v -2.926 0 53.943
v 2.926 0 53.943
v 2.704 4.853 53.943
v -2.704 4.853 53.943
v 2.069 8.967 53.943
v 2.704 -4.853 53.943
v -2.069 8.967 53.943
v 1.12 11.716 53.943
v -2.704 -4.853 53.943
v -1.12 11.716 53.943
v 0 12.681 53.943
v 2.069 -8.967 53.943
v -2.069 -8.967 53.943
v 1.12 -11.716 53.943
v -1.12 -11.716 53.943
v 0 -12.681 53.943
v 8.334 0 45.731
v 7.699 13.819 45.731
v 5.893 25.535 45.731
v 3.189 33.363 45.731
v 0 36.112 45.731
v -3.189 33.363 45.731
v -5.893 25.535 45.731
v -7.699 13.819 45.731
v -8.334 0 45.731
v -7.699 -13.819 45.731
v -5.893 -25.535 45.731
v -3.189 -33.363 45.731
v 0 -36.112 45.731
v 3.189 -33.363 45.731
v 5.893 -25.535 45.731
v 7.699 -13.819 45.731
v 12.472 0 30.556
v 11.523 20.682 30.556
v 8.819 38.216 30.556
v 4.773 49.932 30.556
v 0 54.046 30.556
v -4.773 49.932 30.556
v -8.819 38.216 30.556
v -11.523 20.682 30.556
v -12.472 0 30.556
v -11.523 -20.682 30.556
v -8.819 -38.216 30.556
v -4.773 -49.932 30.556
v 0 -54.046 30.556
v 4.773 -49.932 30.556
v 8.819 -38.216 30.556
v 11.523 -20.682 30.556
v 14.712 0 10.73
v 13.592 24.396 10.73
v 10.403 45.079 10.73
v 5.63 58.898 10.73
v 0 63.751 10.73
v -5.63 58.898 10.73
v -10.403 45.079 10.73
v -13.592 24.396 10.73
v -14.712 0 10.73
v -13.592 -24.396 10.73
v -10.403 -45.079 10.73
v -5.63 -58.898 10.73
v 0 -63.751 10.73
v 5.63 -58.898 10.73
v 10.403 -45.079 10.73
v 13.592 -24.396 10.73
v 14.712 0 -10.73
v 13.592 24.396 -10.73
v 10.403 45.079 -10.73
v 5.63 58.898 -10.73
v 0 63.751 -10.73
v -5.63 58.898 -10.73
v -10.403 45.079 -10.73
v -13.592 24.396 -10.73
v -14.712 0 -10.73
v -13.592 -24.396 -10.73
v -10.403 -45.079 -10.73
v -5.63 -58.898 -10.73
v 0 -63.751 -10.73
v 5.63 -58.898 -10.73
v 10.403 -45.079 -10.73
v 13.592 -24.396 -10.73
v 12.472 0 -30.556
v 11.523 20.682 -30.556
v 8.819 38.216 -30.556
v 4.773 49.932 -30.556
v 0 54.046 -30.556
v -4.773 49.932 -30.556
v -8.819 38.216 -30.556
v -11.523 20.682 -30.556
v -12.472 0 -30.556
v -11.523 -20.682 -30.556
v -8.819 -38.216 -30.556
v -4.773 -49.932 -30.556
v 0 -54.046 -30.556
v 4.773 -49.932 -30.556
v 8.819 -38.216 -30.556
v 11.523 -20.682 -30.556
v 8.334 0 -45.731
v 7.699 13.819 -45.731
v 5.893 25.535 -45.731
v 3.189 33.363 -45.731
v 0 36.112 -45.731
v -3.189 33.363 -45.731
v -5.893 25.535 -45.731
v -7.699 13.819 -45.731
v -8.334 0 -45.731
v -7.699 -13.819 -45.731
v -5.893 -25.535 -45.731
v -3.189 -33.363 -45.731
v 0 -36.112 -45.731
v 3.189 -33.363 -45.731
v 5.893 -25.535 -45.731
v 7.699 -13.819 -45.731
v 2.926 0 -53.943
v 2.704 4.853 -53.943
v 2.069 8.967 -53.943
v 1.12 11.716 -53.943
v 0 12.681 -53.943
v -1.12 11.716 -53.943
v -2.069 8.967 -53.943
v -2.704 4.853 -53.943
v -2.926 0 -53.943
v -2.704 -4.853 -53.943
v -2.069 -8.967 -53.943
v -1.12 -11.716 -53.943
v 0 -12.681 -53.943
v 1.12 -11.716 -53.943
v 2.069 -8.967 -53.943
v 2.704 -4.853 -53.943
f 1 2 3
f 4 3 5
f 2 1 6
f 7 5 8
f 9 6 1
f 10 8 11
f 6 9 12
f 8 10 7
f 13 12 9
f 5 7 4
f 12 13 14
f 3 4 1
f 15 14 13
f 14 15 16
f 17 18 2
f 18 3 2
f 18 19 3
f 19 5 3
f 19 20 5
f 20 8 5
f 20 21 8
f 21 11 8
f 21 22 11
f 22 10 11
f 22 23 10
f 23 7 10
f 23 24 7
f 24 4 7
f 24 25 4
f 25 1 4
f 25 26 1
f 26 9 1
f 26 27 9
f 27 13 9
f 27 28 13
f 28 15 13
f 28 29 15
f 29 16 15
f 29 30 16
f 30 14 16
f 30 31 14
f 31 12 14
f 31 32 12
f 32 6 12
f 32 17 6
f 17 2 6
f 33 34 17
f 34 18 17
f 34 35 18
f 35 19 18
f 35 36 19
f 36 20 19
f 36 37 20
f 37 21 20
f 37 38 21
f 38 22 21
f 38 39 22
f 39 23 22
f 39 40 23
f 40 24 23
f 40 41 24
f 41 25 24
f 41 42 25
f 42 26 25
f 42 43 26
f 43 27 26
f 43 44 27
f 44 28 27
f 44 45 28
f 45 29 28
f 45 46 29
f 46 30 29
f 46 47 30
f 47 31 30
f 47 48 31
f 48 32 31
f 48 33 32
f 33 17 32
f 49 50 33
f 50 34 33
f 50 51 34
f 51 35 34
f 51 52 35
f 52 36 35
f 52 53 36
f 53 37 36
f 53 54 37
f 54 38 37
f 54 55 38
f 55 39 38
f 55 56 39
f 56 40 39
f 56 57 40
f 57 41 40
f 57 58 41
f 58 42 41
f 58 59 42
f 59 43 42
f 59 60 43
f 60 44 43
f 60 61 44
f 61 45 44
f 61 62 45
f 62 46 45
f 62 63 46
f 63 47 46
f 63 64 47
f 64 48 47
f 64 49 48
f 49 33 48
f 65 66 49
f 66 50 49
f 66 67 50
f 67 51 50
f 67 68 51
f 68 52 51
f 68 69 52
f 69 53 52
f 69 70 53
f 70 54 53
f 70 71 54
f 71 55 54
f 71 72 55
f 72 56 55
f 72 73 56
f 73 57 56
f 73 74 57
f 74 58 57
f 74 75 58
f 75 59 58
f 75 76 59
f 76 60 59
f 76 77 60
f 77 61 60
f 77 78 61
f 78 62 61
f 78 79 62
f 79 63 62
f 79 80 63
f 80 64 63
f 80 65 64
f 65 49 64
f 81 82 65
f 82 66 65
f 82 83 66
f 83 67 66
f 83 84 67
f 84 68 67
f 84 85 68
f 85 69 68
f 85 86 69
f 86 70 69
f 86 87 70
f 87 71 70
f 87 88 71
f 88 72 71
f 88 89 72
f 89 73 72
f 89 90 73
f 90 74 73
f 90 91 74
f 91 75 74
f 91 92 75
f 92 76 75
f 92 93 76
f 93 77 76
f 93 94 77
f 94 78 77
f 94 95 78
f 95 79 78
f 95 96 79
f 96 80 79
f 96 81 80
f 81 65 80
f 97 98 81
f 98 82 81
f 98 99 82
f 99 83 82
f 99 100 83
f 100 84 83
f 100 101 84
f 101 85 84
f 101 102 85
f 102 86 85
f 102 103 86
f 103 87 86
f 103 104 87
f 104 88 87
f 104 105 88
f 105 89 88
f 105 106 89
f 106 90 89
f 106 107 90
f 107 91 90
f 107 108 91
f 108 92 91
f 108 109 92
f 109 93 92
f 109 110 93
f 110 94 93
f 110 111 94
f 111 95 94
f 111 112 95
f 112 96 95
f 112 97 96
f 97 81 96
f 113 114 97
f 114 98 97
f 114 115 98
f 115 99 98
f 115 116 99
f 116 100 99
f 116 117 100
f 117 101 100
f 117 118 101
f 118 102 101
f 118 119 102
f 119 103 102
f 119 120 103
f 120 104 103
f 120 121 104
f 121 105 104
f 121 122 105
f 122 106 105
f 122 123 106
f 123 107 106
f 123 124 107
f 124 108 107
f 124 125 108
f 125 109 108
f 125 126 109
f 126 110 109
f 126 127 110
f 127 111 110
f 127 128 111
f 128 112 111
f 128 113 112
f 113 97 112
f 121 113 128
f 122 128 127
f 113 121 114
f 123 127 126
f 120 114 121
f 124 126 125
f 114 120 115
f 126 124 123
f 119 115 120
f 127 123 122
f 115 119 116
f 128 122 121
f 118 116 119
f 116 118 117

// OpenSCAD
// Generated by SolidPython 1.0.1 on 2020-07-29 00:46:45


scale(v = [3, 13, 11]) {
	sphere(r = 5);
}
/***********************************************
*********      SolidPython code:      **********
************************************************
 
# import packages: SolidPython
from solid import *
from solid.utils import *
from itertools import chain, combinations, permutations


class Resize:

    def __init__(self, scad_file):
        self.scad_file = scad_file
        #self.scad_file = import_scad(scad_file)
        # cone/cylinder param:
        self.r1 = 0
        self.r2 = 0
        self.h = 0
        # rectangular prism param:
        self.w = 0
        self.l = 0
        # ellipse param:
        self.r = 0

    # import OpenScad code (file name corresponds to shape)


    # classify shape + parameters
    def assign(self, param1, param2, param3):
        if self.scad_file == 'cone.scad':
            self.r1 = param1
            self.r2 = param2
            self.h = param3
        elif self.scad_file == 'cylinder.scad':
            self.r1 = param1
            self.r2 = param2
            self.h = param3
        elif self.scad_file == 'rectangularPrism.scad':
            self.h = param1
            self.l = param2
            self.w = param3
        else:
            self.r = param1
            self.h = param2

    # resize parameters
    def iterate(self):
        x = range(3, 20, 2)
        i = 1
        if self.scad_file == 'cone.scad':
            tempList = list(permutations(x, 2))
            for temp in tempList:
                param1 = temp[0]
                param2 = temp[1]
                filepath = 'produced_scad_files/' + 'cone' + str(param1) + '_' + str(param2) + '_' + '.scad'
                scad_render_to_file(cylinder(h=param1, r1=param2, r2=0), filepath)

        elif self.scad_file == 'cylinder.scad':
            tempList = list(permutations(x, 3))
            for temp in tempList:
                param1 = temp[0]
                param2 = temp[1]
                filepath = 'produced_scad_files/' + 'cylinder' + str(param1) + '_' + str(param2) + '_' + '.scad'
                scad_render_to_file(cylinder(h=param1, r1=param2, r2=param2), filepath)

        elif self.scad_file == 'rectangularPrism.scad':
            tempList = list(permutations(x, 3))
            for temp in tempList:
                param1 = temp[0]
                param2 = temp[1]
                param3 = temp[2]
                filepath = 'produced_scad_files/' + 'rectangularPrism' + str(param1) + '_' + str(param2) + '_' + str(
                    param3) + '.scad'
                scad_render_to_file(cube(size=(param1, param2, param3)), filepath)

        elif self.scad_file == 'ellipse.scad':
            tempList = list(permutations(x, 4))
            for temp in tempList:
                param1 = temp[0]
                param2 = temp[1]
                param3 = temp[2]
                param4 = temp[3]
                filepath = 'produced_scad_files/' + 'ellipse' + str(param1) + '_' + str(param2) + '_' + str(param3) + '_' + str(param4) + '.scad'
                scad_render_to_file(scale([param1, param2, param3])(sphere(r=param4)), filepath)

    def render_to_scadfile(self):
        scad_render_to_file(scad, 'example.scad') 
 
************************************************/
